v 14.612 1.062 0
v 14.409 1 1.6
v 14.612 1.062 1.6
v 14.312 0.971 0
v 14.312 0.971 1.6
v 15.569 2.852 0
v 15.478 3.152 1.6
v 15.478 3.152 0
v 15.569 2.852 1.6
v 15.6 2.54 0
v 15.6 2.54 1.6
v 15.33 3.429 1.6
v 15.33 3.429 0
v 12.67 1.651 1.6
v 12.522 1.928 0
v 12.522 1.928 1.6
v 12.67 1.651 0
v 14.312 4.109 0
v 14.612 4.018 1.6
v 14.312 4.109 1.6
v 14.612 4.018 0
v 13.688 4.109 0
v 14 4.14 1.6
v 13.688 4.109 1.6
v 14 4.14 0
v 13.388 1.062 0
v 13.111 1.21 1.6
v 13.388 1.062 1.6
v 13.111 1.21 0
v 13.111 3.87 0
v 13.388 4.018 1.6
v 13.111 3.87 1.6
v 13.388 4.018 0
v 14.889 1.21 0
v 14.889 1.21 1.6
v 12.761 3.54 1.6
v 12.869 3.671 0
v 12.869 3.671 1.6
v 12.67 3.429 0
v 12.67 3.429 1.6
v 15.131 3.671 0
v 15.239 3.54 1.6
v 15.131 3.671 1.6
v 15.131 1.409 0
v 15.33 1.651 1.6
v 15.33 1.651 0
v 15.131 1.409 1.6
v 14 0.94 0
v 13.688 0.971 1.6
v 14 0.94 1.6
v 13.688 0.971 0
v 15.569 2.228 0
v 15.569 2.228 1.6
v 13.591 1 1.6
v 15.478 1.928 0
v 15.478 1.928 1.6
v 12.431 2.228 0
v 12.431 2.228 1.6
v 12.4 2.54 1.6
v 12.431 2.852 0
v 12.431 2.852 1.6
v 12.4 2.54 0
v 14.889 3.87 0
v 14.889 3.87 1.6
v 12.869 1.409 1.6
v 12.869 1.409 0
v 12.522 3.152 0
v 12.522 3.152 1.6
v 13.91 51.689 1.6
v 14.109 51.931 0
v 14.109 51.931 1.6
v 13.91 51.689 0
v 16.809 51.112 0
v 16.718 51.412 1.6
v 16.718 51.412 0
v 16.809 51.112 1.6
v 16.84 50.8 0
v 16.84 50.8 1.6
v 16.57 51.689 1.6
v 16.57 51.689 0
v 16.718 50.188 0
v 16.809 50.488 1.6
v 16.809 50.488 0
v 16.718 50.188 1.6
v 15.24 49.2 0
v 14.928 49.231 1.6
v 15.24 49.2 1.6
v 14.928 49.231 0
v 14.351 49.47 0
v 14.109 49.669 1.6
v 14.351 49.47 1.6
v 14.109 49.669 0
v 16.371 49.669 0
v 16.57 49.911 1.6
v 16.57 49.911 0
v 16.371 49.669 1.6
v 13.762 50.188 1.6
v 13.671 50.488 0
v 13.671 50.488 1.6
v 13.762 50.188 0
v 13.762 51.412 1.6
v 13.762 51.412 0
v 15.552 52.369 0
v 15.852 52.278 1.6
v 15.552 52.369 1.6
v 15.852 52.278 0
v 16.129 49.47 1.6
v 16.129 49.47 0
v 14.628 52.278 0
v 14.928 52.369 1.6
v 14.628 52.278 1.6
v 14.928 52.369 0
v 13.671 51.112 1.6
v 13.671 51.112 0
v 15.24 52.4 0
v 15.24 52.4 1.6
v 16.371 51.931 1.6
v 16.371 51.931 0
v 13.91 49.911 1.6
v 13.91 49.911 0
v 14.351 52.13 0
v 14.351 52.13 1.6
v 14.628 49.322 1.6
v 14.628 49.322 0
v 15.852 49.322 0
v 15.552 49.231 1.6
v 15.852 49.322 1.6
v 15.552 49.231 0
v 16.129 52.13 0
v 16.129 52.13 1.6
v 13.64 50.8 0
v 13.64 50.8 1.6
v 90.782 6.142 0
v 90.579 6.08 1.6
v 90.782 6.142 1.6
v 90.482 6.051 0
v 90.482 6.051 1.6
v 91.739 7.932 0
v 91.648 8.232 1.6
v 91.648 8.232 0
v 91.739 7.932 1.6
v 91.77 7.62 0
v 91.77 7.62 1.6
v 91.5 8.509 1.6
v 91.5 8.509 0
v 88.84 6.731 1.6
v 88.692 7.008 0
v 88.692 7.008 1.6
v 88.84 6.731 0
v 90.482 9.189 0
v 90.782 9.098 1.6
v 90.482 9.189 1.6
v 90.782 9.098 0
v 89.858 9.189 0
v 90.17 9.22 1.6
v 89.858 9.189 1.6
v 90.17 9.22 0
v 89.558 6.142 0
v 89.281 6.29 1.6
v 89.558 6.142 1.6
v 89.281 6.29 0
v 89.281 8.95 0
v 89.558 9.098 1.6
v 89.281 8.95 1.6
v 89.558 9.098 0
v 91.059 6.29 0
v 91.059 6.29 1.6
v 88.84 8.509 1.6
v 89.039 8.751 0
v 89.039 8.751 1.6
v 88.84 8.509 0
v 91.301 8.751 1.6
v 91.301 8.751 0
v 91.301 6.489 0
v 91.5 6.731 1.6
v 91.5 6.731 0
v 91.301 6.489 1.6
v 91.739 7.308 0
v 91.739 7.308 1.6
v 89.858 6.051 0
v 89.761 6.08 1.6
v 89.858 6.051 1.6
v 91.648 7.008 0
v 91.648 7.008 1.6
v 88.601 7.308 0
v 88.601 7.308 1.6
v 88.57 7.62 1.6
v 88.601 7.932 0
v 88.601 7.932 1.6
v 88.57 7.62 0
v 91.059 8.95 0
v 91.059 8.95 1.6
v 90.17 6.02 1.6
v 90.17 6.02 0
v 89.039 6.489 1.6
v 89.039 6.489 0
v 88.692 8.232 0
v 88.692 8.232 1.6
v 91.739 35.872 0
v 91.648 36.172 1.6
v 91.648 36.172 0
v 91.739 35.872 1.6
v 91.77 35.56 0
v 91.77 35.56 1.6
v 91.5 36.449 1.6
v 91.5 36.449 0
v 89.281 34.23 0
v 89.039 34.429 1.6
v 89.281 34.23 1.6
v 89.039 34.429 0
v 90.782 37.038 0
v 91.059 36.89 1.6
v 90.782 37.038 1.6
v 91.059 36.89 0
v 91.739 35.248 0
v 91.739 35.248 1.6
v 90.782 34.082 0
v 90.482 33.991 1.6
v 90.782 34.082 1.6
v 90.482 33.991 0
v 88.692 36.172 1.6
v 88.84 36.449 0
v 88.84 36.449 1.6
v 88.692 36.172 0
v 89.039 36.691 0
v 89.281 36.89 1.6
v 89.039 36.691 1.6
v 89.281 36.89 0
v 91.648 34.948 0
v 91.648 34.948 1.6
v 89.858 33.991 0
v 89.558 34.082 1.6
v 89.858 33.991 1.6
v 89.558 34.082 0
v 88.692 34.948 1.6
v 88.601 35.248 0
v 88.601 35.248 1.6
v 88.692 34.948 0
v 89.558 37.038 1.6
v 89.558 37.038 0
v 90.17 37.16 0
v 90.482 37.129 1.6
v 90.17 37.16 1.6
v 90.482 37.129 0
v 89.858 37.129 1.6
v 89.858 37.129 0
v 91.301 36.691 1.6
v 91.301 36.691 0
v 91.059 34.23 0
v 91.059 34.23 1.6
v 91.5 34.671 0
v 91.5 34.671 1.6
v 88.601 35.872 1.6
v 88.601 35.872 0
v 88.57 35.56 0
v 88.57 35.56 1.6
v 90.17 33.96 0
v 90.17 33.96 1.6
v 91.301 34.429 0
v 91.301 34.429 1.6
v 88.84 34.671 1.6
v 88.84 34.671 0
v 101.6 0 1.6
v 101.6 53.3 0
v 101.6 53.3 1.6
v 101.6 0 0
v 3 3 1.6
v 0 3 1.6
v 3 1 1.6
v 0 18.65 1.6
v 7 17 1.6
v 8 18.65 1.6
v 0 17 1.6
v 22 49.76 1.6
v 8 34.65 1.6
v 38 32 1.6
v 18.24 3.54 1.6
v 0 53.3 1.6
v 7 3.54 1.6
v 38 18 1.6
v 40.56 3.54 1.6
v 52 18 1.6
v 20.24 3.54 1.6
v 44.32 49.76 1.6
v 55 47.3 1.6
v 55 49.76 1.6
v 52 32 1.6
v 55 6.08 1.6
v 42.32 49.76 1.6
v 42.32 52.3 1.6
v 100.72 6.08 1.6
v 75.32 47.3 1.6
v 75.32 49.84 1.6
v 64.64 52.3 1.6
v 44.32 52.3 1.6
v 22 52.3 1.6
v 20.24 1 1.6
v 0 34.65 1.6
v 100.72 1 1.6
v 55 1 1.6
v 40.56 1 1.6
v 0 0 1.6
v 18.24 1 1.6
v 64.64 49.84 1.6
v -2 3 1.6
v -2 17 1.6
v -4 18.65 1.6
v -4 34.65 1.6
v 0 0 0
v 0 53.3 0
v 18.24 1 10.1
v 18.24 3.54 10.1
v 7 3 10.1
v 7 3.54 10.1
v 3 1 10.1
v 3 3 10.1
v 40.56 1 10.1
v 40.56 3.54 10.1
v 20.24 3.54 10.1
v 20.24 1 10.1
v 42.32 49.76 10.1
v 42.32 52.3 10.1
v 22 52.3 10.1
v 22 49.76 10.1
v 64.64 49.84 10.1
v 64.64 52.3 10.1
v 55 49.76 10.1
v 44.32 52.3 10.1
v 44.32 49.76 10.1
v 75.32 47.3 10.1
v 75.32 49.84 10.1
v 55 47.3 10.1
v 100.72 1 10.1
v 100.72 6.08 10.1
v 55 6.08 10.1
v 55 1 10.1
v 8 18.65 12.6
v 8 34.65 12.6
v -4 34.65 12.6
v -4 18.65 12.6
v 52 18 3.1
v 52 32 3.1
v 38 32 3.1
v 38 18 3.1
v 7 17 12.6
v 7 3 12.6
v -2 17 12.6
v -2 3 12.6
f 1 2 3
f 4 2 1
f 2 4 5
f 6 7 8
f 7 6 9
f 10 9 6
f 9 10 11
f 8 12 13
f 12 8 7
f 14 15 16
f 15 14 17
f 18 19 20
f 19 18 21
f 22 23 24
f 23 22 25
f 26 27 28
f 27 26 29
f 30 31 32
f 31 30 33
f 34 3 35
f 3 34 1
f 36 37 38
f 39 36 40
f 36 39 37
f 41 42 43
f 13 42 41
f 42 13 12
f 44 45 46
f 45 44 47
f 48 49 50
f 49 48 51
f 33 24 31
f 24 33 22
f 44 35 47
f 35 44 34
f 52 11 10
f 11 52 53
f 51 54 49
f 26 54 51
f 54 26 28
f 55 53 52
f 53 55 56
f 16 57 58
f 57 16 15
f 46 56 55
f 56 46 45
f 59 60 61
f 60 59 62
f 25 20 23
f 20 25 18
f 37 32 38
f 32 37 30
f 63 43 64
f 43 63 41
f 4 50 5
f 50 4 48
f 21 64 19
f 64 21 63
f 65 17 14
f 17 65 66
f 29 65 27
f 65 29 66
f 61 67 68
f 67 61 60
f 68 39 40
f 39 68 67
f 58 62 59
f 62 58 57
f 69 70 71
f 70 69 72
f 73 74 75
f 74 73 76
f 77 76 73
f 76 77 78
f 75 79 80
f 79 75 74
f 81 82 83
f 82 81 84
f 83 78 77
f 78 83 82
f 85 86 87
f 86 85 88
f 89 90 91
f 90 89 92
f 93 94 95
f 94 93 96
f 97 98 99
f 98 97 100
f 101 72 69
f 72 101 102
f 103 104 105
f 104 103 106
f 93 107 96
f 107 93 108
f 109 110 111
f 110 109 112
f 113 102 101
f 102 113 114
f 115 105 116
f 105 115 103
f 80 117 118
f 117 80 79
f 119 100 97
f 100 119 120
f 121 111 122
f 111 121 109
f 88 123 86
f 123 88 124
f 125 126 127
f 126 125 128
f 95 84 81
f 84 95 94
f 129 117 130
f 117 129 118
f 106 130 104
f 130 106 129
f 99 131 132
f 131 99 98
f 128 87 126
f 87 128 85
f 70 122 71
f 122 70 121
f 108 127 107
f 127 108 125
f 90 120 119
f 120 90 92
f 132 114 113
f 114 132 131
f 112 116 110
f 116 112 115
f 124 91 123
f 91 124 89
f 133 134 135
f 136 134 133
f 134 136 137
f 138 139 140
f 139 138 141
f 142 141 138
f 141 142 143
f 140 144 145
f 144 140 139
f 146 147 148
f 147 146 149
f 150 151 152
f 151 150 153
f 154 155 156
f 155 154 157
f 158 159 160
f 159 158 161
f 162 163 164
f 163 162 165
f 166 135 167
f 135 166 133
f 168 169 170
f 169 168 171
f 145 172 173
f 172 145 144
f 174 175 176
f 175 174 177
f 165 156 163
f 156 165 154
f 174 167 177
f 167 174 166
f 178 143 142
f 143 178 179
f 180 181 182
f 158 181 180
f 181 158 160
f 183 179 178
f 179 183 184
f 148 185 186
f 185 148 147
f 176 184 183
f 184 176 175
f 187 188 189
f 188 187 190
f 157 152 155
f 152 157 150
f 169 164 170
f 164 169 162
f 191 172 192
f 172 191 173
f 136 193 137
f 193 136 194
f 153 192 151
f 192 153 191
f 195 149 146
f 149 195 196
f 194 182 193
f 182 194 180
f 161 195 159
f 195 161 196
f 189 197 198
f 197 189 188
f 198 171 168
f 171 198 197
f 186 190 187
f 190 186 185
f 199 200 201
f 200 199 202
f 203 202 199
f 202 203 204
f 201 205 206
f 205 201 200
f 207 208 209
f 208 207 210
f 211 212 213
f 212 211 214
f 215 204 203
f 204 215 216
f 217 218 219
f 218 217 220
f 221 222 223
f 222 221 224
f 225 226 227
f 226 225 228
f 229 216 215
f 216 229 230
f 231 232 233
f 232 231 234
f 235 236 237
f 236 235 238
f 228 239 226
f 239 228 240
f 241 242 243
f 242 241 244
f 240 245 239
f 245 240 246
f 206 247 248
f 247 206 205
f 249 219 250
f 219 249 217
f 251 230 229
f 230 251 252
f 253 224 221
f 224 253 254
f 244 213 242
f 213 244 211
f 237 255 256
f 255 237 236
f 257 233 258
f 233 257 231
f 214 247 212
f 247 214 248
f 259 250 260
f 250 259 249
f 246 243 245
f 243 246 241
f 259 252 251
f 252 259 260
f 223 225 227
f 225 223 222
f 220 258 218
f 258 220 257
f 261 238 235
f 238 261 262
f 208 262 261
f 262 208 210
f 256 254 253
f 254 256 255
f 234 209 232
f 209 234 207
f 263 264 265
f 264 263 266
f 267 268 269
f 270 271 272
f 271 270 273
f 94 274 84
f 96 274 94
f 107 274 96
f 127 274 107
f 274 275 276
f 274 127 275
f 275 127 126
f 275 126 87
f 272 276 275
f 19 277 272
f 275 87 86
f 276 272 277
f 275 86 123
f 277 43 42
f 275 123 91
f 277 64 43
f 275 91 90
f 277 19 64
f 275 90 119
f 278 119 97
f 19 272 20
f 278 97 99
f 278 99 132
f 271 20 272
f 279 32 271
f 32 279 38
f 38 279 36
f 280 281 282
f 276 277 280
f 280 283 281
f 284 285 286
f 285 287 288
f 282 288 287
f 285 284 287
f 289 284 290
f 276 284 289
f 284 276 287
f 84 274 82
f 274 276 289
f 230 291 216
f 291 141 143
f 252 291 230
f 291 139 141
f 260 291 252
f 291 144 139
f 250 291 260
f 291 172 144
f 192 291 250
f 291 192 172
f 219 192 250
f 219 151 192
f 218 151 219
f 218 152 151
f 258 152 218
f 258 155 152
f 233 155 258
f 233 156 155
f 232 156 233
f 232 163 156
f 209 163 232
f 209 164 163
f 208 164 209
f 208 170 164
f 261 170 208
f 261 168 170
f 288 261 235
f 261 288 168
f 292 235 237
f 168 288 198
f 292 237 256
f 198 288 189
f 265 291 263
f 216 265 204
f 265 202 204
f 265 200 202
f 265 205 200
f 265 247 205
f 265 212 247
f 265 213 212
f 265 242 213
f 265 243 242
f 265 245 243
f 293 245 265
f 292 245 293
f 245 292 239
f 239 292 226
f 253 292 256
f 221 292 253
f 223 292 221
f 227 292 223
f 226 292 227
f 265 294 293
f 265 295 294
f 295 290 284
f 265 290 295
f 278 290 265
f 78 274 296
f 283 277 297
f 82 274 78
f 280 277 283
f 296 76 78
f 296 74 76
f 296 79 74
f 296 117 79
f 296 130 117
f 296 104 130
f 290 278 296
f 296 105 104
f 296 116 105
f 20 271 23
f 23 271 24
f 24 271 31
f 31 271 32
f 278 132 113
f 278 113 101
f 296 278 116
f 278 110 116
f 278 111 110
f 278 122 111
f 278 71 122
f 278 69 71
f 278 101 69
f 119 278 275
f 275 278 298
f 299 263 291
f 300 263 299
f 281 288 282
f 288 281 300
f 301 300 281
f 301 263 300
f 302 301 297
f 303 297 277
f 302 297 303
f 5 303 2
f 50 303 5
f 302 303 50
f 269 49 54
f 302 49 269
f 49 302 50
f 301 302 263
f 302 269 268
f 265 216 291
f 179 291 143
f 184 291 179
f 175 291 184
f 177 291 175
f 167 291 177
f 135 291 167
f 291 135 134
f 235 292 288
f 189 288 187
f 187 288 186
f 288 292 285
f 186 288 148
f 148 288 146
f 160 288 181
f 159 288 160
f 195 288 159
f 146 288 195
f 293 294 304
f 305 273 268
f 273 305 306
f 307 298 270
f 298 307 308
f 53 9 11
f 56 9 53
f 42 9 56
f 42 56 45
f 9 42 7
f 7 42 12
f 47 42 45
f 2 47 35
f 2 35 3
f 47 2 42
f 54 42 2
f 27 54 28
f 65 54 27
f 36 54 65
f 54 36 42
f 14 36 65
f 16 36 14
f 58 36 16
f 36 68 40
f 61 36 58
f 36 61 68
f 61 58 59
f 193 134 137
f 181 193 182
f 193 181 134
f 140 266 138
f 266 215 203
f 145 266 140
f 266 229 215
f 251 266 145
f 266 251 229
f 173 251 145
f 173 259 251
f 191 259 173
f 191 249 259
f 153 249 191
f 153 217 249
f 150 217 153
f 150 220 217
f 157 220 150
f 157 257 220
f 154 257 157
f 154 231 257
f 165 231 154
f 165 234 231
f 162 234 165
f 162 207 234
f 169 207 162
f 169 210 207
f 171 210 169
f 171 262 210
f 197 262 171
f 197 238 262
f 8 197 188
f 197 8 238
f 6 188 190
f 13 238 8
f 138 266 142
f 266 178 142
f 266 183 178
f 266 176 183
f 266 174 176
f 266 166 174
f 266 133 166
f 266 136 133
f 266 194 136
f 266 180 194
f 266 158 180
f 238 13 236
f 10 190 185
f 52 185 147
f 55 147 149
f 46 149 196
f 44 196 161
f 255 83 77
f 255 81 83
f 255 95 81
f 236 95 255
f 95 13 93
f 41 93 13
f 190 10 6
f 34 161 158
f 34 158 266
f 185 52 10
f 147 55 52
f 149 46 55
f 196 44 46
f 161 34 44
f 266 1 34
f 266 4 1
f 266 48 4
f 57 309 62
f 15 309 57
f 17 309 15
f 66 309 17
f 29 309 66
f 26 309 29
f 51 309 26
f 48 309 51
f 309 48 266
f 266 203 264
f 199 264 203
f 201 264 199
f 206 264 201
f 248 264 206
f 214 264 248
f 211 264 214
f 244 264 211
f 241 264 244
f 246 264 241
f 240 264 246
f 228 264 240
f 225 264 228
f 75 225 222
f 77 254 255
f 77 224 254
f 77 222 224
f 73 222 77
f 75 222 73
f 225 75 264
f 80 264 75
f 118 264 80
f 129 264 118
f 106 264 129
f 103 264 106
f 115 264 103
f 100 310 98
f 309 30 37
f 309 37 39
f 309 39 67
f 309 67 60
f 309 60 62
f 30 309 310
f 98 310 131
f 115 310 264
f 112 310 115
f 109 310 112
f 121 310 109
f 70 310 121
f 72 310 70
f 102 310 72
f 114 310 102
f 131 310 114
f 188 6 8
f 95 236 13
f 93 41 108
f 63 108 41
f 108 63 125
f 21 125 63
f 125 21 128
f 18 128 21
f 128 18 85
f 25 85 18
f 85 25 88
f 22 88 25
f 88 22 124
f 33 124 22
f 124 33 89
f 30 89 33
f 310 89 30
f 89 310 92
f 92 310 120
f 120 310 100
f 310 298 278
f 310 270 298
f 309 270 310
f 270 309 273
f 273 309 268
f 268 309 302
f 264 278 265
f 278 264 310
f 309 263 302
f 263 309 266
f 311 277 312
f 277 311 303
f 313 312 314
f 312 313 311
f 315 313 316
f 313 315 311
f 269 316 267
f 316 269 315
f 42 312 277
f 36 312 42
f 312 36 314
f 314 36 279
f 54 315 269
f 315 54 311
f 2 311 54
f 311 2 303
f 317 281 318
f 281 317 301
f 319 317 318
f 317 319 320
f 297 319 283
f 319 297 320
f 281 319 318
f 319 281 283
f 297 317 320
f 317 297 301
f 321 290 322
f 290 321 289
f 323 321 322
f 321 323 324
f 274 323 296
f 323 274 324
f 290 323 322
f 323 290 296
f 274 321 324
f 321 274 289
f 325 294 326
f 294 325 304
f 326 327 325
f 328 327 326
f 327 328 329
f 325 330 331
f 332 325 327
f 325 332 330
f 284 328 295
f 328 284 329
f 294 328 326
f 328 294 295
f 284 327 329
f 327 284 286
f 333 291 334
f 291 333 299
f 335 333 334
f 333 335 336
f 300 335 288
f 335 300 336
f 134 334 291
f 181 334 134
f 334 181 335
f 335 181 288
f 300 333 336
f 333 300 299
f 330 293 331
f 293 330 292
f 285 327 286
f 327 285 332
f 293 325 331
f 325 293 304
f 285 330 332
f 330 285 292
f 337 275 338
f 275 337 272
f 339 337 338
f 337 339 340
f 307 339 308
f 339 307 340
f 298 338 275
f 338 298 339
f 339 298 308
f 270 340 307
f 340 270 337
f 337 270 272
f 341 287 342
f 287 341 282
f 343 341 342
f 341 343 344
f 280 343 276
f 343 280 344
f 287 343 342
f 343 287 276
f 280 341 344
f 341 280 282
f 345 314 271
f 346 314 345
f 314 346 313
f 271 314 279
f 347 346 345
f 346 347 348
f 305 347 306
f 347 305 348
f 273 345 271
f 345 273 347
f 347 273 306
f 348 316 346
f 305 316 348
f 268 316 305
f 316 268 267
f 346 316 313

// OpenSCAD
$fn = 32;
pcb_w = 101.6; pcb_h = 53.3; pcb_t = 1.6;
hole_d = 3.2;

// PCB
color("green") difference() {
    cube([pcb_w, pcb_h, pcb_t]);
    for (p = [[14.0, 2.54], [15.24, 50.8], [90.17, 7.62], [90.17, 35.56]])
        translate([p[0], p[1], -0.1]) cylinder(d=hole_d, h=pcb_t+0.2);
}

// Uno-compatible headers (same side as Uno)
color([0.2,0.2,0.2]) {
    // Analog side
    translate([3.0, 1.0, pcb_t]) cube([6*2.54, 2.54, 8.5]);
    translate([3.0+6*2.54+2.0, 1.0, pcb_t]) cube([8*2.54, 2.54, 8.5]);
    // Digital side
    translate([22.0, pcb_h-3.54, pcb_t]) cube([8*2.54, 2.54, 8.5]);
    translate([22.0+8*2.54+2.0, pcb_h-3.54, pcb_t]) cube([8*2.54, 2.54, 8.5]);
}

// Extended digital pins 22-53: 2x 18-pin double row
color([0.2,0.2,0.2]) {
    translate([55.0, 1.0, pcb_t]) cube([18*2.54, 2*2.54, 8.5]);
}

// Analog A8-A15 header
color([0.2,0.2,0.2]) translate([55.0, pcb_h-6.0, pcb_t]) cube([8*2.54, 2.54, 8.5]);

// USB-B connector
color("silver") translate([-4.0, (pcb_h-16)/2, pcb_t]) cube([12, 16, 11]);

// ATmega2560 QFP
color([0.1,0.1,0.1]) translate([38.0, 18.0, pcb_t]) cube([14, 14, 1.5]);

// Power barrel jack
color([0.2,0.2,0.2]) translate([-2.0, 3.0, pcb_t]) cube([9, 14, 11]);
